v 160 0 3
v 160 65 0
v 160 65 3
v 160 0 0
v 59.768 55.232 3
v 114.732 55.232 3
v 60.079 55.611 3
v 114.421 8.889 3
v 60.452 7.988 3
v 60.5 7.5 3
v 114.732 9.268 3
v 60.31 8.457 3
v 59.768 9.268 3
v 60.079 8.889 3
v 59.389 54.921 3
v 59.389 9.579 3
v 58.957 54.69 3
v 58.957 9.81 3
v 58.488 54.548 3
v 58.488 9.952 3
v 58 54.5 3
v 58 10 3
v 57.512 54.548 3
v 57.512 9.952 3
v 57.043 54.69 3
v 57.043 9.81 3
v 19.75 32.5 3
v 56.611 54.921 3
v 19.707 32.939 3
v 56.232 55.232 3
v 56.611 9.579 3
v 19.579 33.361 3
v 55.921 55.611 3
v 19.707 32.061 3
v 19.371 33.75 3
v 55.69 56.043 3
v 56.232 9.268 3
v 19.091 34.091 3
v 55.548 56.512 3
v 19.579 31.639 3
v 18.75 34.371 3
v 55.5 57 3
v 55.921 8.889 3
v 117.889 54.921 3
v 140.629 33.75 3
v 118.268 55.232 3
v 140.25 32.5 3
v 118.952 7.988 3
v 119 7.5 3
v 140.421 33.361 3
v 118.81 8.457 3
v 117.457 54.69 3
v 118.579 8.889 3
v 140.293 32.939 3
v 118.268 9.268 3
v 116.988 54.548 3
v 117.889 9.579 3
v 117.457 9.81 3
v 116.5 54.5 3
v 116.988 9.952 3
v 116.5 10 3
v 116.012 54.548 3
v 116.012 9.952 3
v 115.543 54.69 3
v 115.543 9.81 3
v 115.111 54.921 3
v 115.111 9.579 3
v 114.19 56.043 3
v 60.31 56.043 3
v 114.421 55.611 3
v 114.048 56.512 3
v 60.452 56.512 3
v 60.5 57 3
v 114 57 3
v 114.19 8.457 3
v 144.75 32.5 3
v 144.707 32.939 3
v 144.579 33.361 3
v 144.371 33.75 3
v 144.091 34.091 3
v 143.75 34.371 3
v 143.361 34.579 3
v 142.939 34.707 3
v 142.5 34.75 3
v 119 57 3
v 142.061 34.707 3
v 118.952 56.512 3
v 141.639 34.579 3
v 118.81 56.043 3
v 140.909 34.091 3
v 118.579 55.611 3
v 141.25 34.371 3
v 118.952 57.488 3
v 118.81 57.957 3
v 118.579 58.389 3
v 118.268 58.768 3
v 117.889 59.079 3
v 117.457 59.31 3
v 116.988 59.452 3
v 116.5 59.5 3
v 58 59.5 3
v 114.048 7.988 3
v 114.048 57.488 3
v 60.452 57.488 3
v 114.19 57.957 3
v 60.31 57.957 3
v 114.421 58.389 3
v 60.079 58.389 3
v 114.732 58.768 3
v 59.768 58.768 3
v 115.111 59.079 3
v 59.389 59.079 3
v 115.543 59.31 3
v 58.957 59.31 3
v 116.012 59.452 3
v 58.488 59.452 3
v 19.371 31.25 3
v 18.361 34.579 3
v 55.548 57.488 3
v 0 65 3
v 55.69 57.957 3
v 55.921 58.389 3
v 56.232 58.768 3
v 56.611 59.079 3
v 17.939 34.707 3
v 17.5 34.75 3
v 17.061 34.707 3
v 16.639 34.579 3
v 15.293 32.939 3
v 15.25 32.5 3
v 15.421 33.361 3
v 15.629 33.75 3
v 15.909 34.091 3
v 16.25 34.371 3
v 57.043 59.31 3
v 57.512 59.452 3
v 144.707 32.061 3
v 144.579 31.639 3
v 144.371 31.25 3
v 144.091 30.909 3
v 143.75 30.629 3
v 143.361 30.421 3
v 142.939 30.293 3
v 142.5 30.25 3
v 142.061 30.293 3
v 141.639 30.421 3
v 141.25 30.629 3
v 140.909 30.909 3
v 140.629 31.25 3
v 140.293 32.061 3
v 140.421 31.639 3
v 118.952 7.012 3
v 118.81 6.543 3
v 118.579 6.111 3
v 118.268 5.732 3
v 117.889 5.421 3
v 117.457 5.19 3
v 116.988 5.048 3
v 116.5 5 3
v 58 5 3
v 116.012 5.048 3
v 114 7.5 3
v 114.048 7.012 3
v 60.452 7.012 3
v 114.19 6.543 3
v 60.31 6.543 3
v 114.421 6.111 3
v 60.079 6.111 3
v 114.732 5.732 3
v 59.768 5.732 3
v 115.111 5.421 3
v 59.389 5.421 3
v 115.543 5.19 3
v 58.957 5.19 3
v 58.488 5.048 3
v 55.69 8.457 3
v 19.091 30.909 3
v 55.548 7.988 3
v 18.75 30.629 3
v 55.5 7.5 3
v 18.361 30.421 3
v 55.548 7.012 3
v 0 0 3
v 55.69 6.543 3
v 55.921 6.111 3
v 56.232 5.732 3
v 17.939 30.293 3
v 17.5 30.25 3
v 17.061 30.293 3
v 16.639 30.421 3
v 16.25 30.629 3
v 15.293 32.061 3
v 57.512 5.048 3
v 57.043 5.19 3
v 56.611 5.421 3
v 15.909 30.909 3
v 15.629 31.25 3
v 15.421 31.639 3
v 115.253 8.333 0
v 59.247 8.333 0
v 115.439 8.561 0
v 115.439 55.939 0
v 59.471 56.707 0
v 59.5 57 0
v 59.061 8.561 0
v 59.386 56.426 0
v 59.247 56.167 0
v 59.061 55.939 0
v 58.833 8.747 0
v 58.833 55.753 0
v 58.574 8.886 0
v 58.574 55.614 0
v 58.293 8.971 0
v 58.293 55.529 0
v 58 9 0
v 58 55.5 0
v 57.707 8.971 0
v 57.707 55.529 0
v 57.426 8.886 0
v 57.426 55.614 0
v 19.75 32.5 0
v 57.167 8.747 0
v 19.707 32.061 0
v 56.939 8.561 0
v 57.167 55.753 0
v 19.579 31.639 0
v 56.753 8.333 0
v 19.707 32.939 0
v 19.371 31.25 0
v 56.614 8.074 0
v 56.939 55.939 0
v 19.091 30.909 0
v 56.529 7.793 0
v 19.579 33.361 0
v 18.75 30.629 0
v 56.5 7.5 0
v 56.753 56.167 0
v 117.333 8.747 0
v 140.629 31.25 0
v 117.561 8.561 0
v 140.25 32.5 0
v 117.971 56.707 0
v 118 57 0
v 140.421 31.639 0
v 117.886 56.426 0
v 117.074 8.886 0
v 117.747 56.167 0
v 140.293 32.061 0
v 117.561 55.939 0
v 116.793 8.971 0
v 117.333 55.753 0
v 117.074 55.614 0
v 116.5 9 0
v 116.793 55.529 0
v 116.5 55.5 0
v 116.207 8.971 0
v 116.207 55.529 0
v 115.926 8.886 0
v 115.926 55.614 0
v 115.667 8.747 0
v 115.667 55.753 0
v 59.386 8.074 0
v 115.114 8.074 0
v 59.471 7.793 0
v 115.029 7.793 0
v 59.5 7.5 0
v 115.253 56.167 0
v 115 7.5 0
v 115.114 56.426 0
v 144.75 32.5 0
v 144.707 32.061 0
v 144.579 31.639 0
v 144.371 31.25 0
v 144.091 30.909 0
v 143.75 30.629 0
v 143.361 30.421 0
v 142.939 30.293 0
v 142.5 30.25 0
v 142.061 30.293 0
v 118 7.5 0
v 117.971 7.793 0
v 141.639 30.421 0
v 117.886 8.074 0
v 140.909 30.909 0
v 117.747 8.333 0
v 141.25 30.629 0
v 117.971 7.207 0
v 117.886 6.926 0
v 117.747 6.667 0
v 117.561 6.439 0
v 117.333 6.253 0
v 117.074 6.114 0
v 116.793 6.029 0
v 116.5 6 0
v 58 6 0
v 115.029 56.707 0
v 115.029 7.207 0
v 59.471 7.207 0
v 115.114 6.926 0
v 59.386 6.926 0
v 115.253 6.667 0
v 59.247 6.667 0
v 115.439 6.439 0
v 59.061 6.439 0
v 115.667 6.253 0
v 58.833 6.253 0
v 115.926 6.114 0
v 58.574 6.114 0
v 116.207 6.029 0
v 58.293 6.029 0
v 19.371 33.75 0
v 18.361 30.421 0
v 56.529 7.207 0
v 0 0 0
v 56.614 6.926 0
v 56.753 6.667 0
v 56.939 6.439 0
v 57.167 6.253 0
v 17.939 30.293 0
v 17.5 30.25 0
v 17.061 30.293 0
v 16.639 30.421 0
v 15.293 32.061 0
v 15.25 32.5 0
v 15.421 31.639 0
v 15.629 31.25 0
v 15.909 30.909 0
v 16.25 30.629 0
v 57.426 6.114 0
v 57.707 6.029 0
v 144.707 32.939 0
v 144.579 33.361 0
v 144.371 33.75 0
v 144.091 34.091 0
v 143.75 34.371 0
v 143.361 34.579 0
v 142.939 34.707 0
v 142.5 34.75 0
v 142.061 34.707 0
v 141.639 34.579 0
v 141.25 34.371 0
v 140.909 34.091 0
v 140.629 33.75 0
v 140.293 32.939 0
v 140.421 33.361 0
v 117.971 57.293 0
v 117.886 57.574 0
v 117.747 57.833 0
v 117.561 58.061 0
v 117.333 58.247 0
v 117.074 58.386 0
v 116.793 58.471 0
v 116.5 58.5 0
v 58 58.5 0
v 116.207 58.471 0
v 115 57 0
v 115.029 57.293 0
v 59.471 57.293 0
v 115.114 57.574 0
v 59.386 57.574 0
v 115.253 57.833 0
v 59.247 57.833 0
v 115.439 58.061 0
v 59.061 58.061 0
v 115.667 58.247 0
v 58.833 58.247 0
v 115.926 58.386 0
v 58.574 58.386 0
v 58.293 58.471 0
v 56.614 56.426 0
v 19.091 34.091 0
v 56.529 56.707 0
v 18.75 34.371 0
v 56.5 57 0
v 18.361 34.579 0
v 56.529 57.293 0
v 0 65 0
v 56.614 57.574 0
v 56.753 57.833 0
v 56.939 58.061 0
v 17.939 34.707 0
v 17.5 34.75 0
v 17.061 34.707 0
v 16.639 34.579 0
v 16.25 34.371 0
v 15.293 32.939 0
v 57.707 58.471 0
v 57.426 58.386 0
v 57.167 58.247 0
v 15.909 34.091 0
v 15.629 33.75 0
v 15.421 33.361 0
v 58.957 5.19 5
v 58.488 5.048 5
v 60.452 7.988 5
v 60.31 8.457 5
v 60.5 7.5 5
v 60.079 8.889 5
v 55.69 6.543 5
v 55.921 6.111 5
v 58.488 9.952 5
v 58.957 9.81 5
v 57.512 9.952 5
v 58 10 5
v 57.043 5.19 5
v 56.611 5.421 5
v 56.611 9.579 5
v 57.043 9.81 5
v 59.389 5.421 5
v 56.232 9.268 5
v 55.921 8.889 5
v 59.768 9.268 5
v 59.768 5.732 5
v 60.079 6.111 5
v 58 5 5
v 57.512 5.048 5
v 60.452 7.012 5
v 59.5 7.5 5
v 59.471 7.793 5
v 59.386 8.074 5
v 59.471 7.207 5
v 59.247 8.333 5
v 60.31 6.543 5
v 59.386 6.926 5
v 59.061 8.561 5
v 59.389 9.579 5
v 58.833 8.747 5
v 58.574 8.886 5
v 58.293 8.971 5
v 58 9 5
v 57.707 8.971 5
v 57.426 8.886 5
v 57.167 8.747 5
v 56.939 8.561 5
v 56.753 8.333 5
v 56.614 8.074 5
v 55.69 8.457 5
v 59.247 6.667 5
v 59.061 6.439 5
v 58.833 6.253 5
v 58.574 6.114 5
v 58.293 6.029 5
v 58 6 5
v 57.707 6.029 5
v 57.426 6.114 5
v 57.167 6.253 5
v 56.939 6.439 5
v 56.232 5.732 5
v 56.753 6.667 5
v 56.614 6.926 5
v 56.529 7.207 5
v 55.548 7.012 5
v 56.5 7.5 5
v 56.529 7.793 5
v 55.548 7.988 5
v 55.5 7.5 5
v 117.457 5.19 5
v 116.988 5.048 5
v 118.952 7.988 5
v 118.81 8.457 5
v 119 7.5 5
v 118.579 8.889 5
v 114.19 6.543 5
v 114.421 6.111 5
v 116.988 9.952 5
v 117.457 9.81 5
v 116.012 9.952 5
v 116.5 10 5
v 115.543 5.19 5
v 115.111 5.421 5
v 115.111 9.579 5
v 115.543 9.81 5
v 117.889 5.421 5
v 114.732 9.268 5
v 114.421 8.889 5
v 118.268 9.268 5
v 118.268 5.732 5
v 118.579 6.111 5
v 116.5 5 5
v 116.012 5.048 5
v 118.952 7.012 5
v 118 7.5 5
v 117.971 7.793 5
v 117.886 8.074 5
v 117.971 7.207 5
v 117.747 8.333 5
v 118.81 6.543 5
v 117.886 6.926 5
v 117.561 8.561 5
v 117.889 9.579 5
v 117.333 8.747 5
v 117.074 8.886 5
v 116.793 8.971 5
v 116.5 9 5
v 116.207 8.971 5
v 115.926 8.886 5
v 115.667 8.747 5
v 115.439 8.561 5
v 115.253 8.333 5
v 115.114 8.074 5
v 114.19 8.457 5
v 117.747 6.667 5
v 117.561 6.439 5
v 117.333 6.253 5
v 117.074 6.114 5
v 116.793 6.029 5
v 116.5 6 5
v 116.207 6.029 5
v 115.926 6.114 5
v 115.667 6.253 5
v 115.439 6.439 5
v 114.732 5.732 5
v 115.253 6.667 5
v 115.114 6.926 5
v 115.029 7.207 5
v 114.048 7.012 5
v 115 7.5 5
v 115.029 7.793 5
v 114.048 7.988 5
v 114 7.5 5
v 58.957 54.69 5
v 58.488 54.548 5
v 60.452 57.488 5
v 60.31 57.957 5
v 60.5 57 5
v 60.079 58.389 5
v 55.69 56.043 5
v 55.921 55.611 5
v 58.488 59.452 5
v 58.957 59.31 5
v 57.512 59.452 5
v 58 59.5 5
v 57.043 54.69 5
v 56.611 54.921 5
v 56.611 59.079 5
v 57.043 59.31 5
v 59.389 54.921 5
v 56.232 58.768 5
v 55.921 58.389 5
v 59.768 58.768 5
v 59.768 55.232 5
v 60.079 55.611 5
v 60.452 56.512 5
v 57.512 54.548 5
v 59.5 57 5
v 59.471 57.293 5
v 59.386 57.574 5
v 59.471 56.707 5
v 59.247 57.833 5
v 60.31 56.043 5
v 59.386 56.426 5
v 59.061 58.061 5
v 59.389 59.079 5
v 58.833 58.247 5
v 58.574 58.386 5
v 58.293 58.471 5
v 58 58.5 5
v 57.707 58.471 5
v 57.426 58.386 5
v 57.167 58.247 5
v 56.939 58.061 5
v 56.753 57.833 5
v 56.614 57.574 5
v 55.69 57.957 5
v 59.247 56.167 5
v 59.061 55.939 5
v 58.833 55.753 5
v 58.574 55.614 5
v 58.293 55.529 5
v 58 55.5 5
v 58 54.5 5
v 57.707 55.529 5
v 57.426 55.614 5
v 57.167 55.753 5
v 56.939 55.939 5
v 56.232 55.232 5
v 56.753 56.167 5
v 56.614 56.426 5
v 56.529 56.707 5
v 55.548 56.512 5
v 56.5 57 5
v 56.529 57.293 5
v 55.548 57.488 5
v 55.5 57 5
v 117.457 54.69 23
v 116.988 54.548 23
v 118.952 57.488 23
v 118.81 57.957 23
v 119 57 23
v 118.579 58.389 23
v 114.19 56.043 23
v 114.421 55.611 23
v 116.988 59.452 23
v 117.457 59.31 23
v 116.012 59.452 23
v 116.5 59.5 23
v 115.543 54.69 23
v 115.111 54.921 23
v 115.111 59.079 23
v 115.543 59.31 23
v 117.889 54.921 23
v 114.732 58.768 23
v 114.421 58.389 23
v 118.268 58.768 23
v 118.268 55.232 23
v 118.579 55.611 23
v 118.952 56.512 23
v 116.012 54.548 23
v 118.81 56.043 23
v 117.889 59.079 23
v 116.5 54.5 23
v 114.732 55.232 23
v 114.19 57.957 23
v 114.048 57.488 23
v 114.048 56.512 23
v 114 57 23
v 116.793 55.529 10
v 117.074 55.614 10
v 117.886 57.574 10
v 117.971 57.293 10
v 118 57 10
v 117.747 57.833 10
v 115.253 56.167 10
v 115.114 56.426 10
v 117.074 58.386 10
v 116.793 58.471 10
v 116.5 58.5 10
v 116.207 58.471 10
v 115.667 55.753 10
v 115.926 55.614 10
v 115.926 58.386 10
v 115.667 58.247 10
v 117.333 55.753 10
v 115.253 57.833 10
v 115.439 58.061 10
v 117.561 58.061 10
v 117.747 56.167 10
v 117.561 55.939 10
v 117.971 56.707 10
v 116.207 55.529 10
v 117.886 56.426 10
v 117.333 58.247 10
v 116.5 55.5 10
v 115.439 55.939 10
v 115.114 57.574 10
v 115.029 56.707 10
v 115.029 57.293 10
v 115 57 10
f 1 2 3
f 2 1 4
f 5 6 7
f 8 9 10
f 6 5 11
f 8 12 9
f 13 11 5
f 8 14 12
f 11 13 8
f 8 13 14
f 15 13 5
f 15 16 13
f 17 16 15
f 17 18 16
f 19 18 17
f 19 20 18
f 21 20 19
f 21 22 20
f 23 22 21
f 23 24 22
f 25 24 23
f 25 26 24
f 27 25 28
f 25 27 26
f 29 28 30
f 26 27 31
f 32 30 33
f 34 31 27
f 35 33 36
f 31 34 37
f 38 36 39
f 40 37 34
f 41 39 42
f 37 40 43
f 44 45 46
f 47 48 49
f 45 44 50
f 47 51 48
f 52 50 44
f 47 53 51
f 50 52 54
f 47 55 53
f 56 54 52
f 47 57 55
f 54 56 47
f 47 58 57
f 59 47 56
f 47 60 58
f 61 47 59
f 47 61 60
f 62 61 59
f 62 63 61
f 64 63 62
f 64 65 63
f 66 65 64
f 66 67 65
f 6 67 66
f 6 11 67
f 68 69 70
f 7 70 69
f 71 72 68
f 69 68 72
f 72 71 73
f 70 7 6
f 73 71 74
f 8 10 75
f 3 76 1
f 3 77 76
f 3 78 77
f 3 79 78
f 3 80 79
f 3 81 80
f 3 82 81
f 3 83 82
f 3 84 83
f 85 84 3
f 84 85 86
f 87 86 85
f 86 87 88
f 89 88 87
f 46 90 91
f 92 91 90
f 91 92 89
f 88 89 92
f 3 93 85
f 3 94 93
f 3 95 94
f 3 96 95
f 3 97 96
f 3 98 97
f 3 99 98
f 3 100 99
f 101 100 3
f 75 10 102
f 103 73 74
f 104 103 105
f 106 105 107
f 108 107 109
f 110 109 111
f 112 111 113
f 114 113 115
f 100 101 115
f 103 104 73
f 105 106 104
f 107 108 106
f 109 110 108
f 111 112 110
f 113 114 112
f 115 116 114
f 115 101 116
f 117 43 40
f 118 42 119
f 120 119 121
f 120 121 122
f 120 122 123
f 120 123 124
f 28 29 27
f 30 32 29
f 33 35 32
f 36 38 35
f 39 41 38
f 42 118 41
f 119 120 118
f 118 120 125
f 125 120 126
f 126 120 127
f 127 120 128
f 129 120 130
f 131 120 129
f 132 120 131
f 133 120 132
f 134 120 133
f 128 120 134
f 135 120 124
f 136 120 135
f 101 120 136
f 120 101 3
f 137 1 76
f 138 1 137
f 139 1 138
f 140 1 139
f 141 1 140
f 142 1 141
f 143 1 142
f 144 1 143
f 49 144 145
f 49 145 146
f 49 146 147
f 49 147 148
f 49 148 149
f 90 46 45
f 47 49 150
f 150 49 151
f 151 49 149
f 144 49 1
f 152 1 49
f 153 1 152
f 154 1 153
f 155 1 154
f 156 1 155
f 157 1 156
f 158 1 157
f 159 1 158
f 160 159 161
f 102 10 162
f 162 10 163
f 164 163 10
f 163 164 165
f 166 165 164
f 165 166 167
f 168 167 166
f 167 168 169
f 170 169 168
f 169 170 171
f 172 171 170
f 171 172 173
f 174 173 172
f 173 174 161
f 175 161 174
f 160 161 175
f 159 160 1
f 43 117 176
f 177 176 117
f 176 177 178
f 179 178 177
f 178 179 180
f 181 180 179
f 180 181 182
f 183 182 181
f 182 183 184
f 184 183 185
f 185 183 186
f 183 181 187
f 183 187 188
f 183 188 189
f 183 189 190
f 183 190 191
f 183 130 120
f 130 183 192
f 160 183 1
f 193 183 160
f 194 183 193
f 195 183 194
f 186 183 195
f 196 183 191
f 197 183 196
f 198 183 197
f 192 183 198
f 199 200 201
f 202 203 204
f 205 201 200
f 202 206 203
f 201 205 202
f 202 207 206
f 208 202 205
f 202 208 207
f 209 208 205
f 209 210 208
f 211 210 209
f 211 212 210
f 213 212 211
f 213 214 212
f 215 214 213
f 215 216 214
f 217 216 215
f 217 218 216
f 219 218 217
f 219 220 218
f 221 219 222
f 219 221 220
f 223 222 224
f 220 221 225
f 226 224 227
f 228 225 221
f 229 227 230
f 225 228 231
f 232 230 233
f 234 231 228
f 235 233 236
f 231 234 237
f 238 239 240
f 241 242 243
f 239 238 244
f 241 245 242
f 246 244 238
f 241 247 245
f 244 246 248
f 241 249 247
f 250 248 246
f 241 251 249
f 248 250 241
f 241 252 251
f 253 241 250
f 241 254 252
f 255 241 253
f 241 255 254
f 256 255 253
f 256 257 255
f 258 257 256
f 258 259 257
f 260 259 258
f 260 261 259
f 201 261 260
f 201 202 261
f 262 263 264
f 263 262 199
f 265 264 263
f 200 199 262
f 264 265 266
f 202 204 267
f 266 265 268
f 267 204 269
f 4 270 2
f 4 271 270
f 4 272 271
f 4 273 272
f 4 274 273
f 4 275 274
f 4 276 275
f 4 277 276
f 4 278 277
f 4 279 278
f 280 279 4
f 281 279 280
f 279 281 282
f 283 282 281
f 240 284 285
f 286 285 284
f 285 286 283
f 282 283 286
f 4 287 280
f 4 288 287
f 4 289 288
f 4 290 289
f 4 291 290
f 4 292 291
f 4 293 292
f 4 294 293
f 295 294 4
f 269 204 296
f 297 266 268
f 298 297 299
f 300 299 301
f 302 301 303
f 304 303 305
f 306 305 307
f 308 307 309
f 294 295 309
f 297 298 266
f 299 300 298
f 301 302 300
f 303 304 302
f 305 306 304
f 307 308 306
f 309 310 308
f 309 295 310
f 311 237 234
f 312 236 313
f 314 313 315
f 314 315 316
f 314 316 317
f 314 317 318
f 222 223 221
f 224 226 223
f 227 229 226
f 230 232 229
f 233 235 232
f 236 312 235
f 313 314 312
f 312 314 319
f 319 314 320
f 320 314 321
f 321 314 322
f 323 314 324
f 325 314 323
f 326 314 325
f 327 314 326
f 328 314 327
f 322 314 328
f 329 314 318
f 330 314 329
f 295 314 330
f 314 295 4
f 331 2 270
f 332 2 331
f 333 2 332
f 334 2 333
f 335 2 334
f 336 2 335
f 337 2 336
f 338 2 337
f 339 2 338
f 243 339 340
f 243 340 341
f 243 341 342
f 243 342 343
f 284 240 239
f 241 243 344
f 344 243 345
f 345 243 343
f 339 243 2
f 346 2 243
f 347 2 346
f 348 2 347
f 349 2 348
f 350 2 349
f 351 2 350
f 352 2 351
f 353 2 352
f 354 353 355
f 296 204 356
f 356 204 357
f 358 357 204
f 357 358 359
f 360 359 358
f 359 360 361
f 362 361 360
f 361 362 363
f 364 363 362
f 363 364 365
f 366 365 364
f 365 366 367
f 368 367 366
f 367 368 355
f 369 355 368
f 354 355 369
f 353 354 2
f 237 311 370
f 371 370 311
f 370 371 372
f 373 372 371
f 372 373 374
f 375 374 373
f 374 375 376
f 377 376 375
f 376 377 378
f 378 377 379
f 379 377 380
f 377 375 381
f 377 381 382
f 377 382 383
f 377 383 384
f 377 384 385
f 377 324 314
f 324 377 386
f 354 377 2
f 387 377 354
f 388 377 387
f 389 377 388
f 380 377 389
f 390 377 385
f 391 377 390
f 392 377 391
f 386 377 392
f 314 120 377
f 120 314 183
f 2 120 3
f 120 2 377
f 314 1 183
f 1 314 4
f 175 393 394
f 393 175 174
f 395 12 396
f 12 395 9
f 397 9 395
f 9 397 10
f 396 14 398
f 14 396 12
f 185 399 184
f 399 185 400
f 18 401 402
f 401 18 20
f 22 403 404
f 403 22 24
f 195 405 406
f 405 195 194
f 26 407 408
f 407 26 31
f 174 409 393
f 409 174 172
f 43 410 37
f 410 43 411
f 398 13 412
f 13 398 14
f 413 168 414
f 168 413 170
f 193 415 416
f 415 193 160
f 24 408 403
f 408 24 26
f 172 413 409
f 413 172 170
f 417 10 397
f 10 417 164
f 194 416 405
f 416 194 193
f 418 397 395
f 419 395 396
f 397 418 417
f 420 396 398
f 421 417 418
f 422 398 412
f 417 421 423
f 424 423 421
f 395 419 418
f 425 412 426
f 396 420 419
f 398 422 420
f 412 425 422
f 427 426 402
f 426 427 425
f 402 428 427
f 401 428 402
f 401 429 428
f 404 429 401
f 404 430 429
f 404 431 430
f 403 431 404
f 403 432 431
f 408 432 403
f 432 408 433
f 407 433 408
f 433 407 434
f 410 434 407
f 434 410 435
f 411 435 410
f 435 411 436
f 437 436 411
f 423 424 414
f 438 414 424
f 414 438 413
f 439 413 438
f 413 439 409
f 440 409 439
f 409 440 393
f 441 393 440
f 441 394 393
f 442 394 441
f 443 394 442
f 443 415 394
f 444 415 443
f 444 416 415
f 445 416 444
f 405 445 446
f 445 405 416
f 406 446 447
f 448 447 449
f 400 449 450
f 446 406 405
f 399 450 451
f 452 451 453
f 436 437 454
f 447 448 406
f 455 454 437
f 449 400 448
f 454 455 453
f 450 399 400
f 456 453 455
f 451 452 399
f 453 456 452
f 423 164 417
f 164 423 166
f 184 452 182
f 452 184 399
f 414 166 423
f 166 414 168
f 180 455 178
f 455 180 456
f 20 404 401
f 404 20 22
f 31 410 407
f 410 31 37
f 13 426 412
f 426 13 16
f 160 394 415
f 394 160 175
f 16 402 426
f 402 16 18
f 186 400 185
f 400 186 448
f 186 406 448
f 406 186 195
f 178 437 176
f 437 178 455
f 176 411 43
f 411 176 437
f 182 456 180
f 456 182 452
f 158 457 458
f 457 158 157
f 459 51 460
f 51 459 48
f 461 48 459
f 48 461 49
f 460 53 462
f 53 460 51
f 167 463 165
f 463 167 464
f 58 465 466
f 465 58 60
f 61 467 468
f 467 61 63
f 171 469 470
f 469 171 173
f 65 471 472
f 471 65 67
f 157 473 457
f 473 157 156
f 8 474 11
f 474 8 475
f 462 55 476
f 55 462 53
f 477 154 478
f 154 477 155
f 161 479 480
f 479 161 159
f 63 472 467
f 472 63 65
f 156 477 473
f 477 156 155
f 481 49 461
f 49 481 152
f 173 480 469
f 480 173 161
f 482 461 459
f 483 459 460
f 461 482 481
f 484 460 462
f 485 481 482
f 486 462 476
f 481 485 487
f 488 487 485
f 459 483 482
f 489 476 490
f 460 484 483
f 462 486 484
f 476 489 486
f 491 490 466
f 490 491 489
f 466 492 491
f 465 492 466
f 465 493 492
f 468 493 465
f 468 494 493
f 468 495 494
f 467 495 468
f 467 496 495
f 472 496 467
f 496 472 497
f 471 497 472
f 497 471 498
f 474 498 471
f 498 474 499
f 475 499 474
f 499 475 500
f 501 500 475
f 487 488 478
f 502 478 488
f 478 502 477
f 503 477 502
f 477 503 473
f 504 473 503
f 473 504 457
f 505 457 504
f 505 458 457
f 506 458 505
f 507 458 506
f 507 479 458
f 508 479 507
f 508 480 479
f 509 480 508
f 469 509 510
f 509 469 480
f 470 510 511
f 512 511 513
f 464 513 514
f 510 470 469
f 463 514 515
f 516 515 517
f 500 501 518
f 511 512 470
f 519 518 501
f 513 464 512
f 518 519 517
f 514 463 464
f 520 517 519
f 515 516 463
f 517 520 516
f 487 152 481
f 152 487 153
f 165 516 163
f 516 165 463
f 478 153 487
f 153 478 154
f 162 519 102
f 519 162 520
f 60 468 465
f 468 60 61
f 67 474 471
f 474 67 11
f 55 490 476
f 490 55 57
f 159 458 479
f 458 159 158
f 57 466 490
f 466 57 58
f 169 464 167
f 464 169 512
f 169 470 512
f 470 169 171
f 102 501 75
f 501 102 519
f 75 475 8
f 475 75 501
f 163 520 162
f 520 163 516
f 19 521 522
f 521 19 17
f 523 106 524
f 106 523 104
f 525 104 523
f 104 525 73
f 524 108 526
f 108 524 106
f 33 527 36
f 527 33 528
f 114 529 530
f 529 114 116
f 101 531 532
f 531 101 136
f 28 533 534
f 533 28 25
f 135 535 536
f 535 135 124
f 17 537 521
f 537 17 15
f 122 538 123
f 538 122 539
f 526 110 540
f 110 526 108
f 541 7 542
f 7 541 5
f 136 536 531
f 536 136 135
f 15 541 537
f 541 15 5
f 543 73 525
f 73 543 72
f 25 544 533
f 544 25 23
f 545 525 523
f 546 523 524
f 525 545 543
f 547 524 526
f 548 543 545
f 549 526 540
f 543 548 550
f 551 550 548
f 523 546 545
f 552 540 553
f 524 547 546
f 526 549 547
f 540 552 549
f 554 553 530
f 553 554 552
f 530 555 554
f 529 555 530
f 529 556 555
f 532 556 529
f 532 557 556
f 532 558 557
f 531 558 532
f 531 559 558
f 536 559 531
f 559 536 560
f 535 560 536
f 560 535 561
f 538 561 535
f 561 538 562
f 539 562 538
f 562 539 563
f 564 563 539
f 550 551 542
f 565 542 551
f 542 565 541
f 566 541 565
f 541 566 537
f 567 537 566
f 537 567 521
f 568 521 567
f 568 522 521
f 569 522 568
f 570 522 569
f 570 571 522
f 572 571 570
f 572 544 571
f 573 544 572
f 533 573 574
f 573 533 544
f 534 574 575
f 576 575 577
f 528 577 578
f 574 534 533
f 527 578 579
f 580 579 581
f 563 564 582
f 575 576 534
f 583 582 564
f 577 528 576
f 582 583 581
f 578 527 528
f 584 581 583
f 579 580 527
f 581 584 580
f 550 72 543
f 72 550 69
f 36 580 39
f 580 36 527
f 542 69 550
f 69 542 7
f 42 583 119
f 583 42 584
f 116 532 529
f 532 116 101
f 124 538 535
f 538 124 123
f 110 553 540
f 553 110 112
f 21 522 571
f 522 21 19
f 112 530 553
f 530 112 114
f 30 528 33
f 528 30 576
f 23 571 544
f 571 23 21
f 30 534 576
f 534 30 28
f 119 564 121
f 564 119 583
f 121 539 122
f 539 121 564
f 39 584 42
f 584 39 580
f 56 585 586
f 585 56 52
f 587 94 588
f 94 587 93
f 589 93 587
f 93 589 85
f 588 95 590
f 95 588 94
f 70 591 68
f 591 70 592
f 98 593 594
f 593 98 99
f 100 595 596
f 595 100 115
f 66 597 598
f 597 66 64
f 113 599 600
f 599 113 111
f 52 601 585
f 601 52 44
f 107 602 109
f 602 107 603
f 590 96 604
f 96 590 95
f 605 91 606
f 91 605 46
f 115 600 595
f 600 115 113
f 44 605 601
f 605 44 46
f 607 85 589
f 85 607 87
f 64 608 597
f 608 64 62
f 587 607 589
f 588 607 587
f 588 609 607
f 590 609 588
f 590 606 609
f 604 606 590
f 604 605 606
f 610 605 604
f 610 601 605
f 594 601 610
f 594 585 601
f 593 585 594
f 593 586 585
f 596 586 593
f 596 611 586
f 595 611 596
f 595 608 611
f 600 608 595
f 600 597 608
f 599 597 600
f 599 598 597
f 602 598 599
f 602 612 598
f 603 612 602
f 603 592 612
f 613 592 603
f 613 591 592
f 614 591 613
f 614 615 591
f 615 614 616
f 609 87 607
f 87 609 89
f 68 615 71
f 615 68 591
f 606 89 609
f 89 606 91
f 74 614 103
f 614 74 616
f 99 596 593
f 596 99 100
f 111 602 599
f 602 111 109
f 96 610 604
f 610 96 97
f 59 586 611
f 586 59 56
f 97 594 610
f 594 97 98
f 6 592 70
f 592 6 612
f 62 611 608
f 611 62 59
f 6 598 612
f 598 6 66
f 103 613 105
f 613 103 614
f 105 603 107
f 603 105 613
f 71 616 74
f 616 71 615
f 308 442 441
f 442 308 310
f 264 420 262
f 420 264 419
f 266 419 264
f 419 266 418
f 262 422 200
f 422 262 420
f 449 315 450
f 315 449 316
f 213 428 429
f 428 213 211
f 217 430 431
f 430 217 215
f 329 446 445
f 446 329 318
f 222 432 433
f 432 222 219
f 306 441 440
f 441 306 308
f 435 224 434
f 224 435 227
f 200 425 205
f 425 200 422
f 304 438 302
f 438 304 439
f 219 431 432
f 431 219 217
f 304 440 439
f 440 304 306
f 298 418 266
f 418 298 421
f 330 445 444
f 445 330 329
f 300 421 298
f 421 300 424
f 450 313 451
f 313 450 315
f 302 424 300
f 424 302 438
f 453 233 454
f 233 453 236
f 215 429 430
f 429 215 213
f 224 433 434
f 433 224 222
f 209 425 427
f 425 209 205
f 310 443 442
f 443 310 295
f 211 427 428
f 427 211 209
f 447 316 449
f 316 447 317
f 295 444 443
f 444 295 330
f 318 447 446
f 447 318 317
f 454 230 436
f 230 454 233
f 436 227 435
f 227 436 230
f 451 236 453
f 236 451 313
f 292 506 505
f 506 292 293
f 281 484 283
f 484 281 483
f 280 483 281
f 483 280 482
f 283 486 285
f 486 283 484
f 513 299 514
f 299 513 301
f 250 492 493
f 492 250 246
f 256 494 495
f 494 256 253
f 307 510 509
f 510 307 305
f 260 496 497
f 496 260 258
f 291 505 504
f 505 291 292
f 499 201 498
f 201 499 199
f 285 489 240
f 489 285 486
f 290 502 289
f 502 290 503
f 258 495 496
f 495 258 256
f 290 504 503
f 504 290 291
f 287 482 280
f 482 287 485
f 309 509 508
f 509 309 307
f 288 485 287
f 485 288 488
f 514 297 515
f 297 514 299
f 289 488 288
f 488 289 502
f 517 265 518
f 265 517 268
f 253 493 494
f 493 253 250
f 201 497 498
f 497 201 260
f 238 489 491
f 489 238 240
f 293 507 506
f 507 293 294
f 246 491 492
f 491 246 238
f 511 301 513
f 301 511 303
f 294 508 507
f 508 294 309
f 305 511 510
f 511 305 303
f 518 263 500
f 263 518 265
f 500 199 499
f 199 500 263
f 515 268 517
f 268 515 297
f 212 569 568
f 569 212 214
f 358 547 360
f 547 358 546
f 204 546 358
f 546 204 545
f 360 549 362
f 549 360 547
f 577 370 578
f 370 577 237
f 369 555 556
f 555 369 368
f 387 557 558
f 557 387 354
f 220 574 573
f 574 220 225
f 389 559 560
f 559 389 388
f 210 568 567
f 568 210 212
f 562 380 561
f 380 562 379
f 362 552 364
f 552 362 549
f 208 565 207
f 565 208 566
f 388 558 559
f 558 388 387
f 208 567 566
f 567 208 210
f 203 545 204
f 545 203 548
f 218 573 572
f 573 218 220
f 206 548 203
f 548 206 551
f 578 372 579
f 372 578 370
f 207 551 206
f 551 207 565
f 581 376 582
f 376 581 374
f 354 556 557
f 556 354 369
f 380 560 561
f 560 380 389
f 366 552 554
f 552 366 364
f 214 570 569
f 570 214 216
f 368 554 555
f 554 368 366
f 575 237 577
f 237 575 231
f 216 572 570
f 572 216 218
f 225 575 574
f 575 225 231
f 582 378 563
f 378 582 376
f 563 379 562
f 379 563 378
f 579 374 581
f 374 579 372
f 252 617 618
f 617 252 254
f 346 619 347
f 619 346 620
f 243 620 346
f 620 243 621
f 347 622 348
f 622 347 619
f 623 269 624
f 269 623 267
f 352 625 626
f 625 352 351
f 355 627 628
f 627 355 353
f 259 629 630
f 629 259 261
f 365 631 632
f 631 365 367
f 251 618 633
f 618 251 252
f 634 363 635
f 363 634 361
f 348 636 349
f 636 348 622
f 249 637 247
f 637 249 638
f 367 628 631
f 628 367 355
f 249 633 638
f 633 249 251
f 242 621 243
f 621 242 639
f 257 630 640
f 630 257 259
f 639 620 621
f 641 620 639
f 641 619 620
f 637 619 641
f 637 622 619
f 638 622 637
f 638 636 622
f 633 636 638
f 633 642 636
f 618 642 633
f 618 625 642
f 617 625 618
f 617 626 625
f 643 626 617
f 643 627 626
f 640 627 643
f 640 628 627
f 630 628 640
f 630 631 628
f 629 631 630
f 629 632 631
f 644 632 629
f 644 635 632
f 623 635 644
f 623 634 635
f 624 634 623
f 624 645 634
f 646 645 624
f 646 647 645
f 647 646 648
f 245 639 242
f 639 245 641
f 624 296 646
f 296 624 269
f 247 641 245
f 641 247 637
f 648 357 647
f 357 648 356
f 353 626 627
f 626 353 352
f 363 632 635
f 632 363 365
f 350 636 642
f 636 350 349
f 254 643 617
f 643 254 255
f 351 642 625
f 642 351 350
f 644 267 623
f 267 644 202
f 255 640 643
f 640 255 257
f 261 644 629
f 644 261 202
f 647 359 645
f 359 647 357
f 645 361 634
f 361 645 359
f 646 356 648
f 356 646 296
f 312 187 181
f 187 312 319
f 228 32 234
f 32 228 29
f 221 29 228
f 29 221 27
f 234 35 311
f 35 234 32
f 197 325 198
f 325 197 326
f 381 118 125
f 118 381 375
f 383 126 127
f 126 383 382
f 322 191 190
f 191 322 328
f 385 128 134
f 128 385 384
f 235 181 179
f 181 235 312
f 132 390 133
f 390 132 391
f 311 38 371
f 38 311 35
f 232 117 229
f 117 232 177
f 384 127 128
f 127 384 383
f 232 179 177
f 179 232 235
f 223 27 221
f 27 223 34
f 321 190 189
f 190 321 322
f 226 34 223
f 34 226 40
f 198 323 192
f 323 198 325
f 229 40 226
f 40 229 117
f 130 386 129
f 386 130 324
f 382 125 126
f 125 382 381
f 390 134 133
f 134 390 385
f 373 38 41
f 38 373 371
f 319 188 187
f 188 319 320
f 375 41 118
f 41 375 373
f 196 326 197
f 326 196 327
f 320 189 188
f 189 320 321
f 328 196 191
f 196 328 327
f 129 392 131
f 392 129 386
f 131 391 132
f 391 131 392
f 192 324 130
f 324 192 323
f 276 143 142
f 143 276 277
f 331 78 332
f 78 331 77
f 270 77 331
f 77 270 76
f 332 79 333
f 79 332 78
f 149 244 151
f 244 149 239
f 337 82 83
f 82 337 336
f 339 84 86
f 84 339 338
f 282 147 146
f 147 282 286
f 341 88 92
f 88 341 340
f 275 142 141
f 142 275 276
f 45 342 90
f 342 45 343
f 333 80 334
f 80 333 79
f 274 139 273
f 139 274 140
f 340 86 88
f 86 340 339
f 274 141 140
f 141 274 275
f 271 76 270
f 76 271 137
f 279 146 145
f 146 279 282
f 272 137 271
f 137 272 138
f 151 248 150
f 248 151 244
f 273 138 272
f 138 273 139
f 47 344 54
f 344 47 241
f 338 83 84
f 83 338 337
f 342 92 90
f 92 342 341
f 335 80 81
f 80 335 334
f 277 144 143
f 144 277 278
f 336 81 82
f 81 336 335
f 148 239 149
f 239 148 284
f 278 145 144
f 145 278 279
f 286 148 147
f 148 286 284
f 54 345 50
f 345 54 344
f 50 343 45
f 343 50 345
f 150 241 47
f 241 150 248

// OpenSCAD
$fn=32;

module front(){
    difference(){
        cube([160,65,27]);
        translate([(160-90)/2,(65-55)/2,-1])cube([90,55,28]);
        translate([((160-99)/2)+3,(65-59)/2,2])cube([99,59,28]);
        
        translate([20+((160-99)/2)+3,0,-2+14])cube([65,60,15]);
        //translate([76.5-7.5+((160-90)/2)-3,((65-53)/2)-10,-2+14])cube([15,10,15]);
        translate([((160-90)/2)/2,65/2,10]) union(){
            #cylinder(h=1.75,d1=8,d2=4.5);
            #translate([0,0,-10])cylinder(h=10,d=8);
            #translate([0,0,1.75])cylinder(h=20,d=4.5);
        }
        
        translate([160-((160-90)/2)/2,65/2,10]) union(){
            #cylinder(h=1.75,d1=8,d2=4.5);
            #translate([0,0,-10])cylinder(h=10,d=8);
            #translate([0,0,1.75])cylinder(h=20,d=4.5);
            
        }
    }
        
}

module back(){
    difference(){
        union(){
            cube([160,65,3]);
            translate([58,7.5,3]) cylinder(h=2,d=5);
            translate([160-43.5,7.5,3]) cylinder(h=2,d=5);
            translate([58,65-8,3]) cylinder(h=2,d=5);
            translate([160-43.5,65-8,3]) cylinder(h=20,d=5);
        }
        translate([58,7.5,0])cylinder(h=10,d=3);
        translate([160-43.5,7.5,0])cylinder(h=10,d=3);
        translate([58,65-8,0])cylinder(h=10,d=3);
        translate([160-43.5,65-8,0])cylinder(h=10,d=3);
        
        #translate([((160-90)/2)/2,65/2,0])cylinder(h=20,d=4.5);
        translate([160-((160-90)/2)/2,65/2,0])cylinder(h=20,d=4.5);
    }
}

//front();
back();
